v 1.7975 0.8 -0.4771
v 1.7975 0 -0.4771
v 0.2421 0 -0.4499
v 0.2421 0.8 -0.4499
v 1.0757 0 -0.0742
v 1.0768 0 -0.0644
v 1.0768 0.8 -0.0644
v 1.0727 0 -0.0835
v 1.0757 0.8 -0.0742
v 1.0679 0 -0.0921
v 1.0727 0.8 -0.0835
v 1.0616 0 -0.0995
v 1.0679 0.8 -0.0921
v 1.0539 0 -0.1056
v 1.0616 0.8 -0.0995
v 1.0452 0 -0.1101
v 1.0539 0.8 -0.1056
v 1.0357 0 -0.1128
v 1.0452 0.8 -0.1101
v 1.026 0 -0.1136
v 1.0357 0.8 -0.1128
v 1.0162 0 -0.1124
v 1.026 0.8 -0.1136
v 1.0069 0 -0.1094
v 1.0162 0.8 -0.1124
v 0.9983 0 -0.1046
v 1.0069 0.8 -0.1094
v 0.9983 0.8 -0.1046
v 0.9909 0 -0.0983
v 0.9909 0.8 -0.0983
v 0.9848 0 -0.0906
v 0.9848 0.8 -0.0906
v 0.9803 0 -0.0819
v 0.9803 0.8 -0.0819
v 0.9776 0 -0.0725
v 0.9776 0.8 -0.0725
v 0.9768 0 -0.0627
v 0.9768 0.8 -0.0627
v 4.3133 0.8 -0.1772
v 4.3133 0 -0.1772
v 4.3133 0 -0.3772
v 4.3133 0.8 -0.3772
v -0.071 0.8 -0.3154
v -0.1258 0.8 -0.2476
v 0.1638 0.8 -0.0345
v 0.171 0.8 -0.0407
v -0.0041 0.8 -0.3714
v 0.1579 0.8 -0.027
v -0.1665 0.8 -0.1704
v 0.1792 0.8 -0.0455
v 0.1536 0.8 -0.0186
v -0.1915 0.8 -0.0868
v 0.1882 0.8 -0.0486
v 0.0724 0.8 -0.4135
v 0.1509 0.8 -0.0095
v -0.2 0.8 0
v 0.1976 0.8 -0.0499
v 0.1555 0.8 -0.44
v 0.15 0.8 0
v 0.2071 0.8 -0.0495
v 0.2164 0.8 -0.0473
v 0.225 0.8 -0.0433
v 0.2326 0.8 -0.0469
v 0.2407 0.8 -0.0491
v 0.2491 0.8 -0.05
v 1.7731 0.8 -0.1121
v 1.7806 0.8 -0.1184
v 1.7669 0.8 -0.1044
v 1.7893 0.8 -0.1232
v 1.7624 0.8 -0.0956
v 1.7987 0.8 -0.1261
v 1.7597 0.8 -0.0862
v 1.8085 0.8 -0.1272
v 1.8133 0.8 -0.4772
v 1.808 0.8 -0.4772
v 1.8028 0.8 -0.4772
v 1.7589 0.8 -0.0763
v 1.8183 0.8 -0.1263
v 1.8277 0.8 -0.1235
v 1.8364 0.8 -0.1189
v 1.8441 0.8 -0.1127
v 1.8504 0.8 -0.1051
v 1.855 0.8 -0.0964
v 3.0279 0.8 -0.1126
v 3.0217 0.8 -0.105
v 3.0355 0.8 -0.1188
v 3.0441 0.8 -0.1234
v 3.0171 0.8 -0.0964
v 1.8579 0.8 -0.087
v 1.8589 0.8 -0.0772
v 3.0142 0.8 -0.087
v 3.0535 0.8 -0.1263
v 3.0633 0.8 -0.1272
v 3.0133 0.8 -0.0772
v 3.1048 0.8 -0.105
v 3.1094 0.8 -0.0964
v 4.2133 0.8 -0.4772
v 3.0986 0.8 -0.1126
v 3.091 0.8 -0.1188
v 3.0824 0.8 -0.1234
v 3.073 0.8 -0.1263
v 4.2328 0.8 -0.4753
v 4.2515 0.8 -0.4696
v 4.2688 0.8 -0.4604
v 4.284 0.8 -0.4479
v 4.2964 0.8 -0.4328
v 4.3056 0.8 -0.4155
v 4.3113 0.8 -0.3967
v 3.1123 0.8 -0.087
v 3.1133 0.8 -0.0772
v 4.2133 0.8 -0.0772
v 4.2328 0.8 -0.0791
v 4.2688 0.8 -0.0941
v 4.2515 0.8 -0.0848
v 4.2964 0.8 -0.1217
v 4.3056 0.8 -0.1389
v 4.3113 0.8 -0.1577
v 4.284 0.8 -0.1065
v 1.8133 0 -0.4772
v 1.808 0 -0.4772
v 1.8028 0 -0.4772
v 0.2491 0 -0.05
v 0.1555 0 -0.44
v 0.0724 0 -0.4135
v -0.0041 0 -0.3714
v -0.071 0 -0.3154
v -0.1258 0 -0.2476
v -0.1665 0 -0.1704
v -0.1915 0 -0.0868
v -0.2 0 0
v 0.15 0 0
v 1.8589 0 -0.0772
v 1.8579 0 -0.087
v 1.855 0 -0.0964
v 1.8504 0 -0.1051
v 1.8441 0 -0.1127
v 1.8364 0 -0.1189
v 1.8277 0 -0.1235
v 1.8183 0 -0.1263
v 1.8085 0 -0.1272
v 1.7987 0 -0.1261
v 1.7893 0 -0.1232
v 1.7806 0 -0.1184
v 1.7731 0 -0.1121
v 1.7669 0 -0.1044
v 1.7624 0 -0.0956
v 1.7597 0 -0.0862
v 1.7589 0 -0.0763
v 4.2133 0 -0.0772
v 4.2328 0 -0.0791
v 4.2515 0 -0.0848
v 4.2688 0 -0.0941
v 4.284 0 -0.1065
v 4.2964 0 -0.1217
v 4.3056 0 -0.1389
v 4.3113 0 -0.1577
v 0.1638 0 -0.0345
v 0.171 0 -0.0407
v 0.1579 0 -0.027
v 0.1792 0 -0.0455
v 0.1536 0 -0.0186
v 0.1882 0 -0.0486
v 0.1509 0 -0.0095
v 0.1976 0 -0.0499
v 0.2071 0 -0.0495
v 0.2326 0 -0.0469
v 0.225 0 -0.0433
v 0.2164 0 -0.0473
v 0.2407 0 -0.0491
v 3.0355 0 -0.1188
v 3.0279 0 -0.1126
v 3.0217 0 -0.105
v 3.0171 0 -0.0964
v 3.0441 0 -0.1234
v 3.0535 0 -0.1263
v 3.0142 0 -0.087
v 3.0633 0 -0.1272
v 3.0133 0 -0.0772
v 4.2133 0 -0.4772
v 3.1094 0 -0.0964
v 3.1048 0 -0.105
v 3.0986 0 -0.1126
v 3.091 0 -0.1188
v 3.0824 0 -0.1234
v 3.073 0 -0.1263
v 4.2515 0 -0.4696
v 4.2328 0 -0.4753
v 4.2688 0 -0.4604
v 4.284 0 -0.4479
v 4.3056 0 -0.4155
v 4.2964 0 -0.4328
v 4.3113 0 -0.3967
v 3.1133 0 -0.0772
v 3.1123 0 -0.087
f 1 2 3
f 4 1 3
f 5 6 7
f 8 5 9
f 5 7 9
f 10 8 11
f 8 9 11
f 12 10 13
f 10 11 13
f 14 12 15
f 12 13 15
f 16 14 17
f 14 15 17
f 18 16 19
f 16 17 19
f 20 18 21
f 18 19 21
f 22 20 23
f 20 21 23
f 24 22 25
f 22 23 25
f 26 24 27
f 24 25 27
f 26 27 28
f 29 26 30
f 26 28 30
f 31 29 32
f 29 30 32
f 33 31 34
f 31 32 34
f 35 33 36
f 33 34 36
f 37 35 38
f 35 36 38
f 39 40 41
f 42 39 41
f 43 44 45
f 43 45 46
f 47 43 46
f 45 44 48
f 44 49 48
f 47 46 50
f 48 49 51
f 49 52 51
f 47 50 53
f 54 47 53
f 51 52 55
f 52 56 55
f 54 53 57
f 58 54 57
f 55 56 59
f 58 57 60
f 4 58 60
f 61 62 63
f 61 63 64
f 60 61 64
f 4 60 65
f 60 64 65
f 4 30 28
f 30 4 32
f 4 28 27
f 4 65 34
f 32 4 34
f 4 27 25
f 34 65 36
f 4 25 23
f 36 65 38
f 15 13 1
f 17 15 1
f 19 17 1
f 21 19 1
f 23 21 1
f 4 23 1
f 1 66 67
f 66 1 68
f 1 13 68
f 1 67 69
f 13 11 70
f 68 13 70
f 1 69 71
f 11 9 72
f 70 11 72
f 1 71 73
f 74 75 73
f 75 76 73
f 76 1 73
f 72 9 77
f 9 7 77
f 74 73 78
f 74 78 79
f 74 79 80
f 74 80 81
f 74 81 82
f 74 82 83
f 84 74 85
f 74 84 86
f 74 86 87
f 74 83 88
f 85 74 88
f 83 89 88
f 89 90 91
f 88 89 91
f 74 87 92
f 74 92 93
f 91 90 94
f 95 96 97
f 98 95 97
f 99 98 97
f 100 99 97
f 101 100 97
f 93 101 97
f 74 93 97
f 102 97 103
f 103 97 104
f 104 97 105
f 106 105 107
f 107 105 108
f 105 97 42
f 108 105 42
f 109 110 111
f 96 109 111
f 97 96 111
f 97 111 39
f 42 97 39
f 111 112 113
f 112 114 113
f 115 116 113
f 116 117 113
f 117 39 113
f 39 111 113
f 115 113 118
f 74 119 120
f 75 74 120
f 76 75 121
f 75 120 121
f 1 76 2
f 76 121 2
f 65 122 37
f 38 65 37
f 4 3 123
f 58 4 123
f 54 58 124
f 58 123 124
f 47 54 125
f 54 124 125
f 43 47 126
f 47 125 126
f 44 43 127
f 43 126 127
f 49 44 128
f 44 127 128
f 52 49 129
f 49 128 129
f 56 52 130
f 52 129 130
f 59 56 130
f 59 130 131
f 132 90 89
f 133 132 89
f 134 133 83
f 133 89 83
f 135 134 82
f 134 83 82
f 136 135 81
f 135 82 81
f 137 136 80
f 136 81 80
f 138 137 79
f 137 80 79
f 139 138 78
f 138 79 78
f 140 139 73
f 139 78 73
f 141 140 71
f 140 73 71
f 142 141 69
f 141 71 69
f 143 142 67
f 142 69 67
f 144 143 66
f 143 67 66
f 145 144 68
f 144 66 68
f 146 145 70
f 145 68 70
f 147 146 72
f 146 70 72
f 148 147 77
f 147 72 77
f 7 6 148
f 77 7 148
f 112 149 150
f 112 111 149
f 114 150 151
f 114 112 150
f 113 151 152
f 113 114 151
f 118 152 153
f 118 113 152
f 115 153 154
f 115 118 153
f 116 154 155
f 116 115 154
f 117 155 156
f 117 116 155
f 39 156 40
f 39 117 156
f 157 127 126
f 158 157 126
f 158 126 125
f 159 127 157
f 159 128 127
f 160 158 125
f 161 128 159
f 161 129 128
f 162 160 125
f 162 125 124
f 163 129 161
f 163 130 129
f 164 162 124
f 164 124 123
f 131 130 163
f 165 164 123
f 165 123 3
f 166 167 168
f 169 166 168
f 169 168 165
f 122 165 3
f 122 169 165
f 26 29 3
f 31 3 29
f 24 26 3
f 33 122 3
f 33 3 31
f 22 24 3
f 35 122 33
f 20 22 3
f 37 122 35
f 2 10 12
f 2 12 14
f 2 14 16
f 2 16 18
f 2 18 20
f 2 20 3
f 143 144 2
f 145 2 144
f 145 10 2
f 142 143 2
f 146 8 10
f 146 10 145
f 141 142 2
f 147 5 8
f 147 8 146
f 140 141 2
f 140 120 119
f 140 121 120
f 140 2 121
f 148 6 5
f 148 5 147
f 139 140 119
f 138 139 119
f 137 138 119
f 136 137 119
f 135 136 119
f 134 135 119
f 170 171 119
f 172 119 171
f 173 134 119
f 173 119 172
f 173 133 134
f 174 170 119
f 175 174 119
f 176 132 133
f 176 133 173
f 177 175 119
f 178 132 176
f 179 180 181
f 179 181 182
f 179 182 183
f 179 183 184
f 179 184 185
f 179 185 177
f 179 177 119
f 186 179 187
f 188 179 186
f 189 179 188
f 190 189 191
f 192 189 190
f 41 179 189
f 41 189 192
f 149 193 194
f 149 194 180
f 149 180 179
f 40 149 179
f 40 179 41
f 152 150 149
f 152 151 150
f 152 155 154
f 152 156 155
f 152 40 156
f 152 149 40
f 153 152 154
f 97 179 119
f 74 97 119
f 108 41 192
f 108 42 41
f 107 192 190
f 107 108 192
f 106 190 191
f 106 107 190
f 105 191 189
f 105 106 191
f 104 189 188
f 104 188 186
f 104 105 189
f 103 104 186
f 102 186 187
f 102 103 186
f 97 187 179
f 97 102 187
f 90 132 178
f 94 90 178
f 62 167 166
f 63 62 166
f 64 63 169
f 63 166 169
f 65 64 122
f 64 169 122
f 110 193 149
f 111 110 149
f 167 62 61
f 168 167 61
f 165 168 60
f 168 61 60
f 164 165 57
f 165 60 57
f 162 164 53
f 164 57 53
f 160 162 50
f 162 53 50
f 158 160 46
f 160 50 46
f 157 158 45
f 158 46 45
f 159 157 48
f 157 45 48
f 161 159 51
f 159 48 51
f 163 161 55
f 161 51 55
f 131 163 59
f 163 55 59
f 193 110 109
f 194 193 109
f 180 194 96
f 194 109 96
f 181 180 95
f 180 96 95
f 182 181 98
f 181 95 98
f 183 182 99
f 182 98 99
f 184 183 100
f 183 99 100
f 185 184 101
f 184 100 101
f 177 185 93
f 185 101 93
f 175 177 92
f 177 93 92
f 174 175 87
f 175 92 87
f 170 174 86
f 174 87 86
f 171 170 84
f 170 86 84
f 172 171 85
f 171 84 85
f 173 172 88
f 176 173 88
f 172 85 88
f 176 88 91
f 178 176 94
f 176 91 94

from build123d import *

# Parameters (mm, degrees)
BOSS_EXTRUDE1_DEPTH = 0.8
SKETCH2_R           = 0.05
CUT_EXTRUDE1_DEPTH  = 10
FILLET2_R           = 0.1


with BuildPart() as part:
    # Sketch1 → Boss-Extrude1 (new body)
    with BuildSketch(Plane(origin=(0, 0, 0), x_dir=(1, 0, 0), z_dir=(0, 1, 0))):
        with BuildLine():
            Line((-0.2, 0), (0.2, 0))
            ThreePointArc((0.2, 0), (0.214337478, 0.035045463), (0.24912738, 0.049992385))
            Line((0.24912738, 0.049992385), (1.804525368, 0.077141958))
            ThreePointArc((1.804525368, 0.077141958), (1.808888303, 0.077199072), (1.813251571, 0.07721811))
            Line((1.813251571, 0.07721811), (4.313251571, 0.07721811))
            Line((4.313251571, 0.07721811), (4.313251571, 0.47721811))
            Line((4.313251571, 0.47721811), (1.813251571, 0.47721811))
            ThreePointArc((1.813251571, 0.47721811), (1.805397689, 0.477183841), (1.797544405, 0.477081036))
            Line((1.797544405, 0.477081036), (0.242146417, 0.449931463))
            ThreePointArc((0.242146417, 0.449931463), (-0.070962702, 0.315409169), (-0.2, 0))
        make_face()
    boss_extrude1 = extrude(amount=BOSS_EXTRUDE1_DEPTH)

    # Mirror1: Boss-Extrude1 across Front Plane
    add(boss_extrude1.mirror(Plane.XY))

    # Sketch2 → Cut-Extrude1 (cut)
    with BuildSketch(Plane(origin=(0, 0.8, 0), x_dir=(1, 0, 0), z_dir=(0, 1, 0))):
        with Locations((0.2, 0)):
            Circle(SKETCH2_R)
        with Locations((1.808888303, 0.077199072)):
            Circle(SKETCH2_R)
        with Locations((3.063251571, 0.07721811)):
            Circle(SKETCH2_R)
        with Locations((1.026826374, 0.063567171)):
            Circle(SKETCH2_R)
    cut_extrude1 = extrude(amount=-CUT_EXTRUDE1_DEPTH, mode=Mode.SUBTRACT)

    # Mirror2: Cut-Extrude1 across plane
    add(cut_extrude1.mirror(Plane.XY), mode=Mode.SUBTRACT)

    # Fillet2
    fillet2_edges = [part.edges().sort_by_distance(p)[0] for p in [
        (4.313251571, 0.4, -0.47721811),
        (4.313251571, 0.4, -0.07721811),
        (4.313251571, 0.4, 0.47721811),
        (4.313251571, 0.4, 0.07721811),
    ]]
    fillet(fillet2_edges, radius=FILLET2_R)

    # SurfaceCut1
    split(bisect_by=Plane.XY, keep=Keep.BOTTOM)


solid = part.part
